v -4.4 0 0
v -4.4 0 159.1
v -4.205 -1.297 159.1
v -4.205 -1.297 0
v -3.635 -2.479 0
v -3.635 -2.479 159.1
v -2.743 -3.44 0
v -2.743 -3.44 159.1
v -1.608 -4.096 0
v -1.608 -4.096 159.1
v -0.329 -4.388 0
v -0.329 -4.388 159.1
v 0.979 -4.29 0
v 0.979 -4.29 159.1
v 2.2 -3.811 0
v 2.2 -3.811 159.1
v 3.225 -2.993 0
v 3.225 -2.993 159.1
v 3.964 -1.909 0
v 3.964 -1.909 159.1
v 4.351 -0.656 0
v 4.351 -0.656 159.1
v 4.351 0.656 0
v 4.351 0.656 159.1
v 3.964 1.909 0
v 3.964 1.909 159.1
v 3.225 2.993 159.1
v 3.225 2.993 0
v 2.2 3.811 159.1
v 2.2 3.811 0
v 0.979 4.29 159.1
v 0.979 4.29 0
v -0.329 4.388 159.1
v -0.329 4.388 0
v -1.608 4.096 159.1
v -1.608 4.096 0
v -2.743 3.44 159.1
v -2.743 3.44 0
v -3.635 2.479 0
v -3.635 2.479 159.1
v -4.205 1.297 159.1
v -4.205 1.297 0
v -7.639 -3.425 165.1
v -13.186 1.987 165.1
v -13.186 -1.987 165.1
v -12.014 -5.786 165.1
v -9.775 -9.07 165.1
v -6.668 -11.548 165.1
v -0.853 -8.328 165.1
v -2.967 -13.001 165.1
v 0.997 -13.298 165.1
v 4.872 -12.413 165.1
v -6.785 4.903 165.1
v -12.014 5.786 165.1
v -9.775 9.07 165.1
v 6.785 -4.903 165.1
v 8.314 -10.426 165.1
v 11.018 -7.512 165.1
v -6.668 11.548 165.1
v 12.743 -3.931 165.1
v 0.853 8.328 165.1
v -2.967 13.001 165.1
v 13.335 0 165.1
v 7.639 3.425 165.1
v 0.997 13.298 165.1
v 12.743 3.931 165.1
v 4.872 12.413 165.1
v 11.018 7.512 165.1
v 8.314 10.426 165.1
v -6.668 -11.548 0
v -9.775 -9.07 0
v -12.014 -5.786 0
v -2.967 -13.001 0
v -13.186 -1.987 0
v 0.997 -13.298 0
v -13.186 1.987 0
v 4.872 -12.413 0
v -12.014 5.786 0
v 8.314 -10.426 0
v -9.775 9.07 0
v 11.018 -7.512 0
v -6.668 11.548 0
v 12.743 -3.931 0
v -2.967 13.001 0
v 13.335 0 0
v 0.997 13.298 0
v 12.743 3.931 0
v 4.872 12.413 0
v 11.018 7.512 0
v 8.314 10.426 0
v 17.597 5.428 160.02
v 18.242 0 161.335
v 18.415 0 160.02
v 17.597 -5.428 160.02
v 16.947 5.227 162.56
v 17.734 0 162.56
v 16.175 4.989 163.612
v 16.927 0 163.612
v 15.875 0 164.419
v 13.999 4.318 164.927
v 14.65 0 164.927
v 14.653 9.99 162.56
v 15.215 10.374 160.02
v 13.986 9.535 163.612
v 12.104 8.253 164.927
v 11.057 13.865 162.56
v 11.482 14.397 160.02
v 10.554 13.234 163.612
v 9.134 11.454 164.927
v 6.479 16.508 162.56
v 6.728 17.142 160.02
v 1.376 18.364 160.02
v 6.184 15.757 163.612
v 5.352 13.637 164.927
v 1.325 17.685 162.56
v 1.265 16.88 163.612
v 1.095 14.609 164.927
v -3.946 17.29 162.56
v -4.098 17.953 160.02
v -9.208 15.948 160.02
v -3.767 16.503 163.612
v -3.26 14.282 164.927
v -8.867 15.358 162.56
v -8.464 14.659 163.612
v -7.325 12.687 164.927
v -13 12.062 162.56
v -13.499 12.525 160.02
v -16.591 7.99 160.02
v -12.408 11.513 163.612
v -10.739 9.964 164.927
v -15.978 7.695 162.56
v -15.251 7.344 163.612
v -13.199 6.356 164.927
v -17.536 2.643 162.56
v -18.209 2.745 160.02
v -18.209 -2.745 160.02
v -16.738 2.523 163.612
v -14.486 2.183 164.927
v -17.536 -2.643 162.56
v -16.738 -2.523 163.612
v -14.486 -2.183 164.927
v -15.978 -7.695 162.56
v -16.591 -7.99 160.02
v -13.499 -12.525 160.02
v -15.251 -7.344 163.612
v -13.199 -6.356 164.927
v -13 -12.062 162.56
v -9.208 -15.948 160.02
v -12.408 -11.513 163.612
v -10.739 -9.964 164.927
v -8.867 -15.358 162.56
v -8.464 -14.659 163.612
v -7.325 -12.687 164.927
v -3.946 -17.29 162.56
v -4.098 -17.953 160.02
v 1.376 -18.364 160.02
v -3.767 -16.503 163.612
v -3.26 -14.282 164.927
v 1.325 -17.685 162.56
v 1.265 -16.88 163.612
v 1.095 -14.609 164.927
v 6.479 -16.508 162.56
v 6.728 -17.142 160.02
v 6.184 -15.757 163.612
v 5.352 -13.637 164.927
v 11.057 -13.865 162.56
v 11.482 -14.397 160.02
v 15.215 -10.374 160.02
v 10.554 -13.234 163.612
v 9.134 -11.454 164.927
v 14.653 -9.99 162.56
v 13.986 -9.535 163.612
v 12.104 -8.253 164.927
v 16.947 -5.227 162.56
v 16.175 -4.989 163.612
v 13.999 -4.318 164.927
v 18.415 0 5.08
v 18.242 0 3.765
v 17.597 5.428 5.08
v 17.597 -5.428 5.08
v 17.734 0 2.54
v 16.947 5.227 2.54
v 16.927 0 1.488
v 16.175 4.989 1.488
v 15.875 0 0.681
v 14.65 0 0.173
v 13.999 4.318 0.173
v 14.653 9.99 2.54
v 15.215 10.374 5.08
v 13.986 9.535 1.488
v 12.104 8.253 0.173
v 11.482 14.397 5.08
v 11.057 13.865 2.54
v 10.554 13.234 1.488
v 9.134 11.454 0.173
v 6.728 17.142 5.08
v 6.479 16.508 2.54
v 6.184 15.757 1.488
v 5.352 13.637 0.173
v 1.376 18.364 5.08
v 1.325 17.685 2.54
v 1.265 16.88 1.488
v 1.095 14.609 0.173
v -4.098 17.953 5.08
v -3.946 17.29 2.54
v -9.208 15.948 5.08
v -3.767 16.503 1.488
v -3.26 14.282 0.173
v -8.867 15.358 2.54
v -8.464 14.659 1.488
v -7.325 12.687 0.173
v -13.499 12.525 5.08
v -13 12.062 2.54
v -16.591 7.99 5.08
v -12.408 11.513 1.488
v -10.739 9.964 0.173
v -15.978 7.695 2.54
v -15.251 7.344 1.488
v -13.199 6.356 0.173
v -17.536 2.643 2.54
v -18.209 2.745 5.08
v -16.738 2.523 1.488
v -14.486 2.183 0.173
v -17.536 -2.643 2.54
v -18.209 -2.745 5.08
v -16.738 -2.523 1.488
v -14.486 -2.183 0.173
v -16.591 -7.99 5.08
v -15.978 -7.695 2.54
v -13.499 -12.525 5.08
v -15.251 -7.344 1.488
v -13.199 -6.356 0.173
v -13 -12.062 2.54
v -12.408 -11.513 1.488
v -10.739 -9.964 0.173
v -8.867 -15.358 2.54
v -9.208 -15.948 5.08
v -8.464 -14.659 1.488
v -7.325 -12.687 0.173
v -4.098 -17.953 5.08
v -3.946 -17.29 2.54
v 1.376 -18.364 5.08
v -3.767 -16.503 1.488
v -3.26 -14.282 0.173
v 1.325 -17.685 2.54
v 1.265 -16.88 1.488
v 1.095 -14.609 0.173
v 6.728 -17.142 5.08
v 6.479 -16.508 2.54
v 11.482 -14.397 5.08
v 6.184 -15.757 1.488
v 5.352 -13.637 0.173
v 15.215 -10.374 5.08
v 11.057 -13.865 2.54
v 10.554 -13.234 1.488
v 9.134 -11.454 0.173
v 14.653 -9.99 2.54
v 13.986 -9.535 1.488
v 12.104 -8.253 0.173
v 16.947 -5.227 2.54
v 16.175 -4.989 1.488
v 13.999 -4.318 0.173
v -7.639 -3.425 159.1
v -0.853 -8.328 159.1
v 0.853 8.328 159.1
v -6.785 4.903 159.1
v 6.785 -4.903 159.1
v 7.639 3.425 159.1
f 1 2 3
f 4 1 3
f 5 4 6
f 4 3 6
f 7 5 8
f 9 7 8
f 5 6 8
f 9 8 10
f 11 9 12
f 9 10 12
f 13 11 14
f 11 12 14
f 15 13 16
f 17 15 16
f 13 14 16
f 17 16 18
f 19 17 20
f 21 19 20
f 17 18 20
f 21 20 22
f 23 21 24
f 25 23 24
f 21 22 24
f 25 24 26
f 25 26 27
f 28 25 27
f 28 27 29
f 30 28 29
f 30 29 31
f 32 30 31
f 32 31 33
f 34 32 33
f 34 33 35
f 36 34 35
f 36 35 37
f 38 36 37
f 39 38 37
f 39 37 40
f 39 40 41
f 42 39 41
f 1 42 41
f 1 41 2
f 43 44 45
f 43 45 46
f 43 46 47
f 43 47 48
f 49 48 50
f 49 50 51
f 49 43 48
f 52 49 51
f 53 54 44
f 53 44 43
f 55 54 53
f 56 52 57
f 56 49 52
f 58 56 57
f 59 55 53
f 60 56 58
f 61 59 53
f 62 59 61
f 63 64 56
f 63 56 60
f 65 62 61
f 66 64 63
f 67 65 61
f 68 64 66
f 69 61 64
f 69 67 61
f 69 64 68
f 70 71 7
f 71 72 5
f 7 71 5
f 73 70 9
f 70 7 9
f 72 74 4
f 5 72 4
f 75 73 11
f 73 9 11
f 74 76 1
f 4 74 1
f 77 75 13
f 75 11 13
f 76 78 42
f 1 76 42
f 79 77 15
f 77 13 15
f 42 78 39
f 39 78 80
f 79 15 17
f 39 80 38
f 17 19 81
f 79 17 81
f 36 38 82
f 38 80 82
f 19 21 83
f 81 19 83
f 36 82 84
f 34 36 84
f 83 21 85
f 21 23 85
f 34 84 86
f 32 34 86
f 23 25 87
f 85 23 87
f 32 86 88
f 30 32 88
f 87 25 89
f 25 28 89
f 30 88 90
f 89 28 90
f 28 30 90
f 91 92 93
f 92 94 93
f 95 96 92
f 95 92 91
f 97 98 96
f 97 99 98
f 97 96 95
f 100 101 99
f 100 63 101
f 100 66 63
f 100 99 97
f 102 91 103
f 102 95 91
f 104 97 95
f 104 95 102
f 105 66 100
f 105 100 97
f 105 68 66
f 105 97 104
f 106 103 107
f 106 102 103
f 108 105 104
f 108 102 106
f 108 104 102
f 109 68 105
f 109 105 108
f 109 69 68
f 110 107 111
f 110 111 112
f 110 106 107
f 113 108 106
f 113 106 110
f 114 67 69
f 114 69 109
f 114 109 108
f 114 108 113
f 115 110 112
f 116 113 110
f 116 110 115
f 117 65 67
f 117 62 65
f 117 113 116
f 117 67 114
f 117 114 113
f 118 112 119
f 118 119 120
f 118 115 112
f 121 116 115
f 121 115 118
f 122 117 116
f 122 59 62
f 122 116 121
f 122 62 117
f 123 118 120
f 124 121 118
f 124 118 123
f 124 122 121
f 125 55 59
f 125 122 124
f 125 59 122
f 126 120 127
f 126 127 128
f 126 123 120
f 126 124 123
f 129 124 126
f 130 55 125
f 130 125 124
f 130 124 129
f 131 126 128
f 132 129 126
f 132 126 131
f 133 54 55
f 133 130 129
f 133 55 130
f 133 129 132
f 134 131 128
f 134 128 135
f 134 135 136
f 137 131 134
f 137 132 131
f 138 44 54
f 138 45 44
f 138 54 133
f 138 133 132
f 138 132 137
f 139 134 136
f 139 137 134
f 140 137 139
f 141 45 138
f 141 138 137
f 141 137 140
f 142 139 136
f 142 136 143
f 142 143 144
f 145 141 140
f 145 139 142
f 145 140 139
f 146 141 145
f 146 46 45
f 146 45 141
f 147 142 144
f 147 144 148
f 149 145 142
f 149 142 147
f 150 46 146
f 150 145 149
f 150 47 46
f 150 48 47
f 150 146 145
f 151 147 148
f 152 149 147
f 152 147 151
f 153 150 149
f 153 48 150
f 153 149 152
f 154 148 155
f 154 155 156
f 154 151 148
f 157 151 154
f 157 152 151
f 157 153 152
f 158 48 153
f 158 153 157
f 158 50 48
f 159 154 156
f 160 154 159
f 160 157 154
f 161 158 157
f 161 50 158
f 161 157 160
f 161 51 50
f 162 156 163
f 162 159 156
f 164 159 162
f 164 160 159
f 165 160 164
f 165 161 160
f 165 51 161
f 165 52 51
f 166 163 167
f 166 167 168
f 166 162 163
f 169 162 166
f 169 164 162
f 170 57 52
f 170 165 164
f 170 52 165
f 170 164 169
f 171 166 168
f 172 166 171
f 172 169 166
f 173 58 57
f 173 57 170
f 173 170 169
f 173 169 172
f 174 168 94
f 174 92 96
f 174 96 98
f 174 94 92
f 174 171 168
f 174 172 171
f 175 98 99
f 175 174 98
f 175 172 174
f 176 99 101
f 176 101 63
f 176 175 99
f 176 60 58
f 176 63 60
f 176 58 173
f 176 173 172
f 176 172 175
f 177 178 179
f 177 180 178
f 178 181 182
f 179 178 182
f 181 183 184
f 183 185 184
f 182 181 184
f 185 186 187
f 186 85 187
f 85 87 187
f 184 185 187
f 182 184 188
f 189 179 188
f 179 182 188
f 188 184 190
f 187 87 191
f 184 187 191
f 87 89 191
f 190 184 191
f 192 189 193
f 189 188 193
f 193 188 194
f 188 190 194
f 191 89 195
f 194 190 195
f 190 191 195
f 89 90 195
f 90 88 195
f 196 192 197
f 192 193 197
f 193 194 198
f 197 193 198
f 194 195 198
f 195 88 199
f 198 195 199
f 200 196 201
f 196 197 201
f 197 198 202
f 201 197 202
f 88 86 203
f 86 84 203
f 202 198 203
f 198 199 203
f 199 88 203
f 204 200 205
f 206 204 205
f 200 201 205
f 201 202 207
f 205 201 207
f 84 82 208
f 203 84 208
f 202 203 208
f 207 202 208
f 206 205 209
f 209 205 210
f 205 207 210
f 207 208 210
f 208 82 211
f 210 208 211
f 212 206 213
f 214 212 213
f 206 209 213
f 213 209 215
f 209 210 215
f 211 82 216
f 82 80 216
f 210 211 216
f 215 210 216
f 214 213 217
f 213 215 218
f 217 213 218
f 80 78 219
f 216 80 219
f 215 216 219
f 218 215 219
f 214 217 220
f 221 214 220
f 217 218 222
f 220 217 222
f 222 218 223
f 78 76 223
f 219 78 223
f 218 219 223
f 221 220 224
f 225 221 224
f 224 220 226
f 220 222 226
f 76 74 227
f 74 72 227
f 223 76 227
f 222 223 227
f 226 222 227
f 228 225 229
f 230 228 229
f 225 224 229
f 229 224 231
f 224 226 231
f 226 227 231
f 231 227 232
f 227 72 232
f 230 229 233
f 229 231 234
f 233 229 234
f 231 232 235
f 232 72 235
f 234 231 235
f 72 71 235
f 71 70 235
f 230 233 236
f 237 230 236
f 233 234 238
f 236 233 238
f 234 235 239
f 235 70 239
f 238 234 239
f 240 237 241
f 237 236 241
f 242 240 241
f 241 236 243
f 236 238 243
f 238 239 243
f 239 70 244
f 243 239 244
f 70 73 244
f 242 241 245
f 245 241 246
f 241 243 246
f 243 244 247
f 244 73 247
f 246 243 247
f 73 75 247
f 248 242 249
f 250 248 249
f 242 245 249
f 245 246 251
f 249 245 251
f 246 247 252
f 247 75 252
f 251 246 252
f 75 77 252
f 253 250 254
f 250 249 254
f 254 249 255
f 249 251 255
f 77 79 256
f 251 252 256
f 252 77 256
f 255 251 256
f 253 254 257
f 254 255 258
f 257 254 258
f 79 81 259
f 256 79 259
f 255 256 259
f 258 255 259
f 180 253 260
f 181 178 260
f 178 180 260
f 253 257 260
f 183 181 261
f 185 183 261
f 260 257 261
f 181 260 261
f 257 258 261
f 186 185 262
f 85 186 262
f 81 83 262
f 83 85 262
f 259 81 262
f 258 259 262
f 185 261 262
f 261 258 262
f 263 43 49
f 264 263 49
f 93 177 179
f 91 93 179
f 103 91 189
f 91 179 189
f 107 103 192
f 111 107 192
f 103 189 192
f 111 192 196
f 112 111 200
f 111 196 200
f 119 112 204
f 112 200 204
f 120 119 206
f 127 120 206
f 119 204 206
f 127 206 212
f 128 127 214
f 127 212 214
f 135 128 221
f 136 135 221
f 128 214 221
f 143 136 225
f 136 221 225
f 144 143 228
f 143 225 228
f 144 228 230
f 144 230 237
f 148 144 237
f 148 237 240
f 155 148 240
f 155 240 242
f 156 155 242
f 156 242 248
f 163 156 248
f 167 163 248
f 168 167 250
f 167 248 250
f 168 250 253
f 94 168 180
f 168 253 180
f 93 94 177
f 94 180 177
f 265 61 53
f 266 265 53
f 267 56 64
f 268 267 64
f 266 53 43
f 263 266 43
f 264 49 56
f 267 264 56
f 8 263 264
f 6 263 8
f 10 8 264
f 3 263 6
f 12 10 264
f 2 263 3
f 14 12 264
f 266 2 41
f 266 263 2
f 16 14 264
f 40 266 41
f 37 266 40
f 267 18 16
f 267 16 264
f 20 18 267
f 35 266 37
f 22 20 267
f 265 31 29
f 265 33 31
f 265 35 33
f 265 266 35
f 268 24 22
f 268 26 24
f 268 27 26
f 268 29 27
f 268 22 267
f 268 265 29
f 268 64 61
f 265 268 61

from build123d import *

# Parameters (mm, degrees)
F0_R     = 18.415
F1_DEPTH = 165.1
F2_R     = 5.08
F3_D     = 8.8
F4_R     = 4.4
F5_DEPTH = 6


with BuildPart() as f1:
    # F0 (on Top) → F1 (new body)
    with BuildSketch(Plane.XY):
        Circle(F0_R)
    extrude(amount=F1_DEPTH)

    # F2
    f2_edges = [f1.edges().sort_by_distance(p)[0] for p in [
        (-18.415, 0, 165.1),
        (-18.415, 0, 0),
    ]]
    fillet(f2_edges, radius=F2_R)

    # F3 (through all)
    with Locations(Plane(origin=(0, 0, 0), x_dir=(1, 0, 0), z_dir=(0, 0, -1))):
        with Locations((0, 0)):
            Hole(F3_D / 2)

    # F4 (on face) → F5 (cut)
    with BuildSketch(Plane.XY.offset(165.1)):
        Polygon((0.8534678569, 8.3279604917), (-6.7854914191, 4.9031050912), (-7.6389592759, -3.4248554005), (-0.8534678569, -8.3279604917), (6.7854914191, -4.9031050912), (7.6389592759, 3.4248554005), align=None)
        Circle(F4_R, mode=Mode.SUBTRACT)
    extrude(amount=-F5_DEPTH, mode=Mode.SUBTRACT)


solid = f1.part
